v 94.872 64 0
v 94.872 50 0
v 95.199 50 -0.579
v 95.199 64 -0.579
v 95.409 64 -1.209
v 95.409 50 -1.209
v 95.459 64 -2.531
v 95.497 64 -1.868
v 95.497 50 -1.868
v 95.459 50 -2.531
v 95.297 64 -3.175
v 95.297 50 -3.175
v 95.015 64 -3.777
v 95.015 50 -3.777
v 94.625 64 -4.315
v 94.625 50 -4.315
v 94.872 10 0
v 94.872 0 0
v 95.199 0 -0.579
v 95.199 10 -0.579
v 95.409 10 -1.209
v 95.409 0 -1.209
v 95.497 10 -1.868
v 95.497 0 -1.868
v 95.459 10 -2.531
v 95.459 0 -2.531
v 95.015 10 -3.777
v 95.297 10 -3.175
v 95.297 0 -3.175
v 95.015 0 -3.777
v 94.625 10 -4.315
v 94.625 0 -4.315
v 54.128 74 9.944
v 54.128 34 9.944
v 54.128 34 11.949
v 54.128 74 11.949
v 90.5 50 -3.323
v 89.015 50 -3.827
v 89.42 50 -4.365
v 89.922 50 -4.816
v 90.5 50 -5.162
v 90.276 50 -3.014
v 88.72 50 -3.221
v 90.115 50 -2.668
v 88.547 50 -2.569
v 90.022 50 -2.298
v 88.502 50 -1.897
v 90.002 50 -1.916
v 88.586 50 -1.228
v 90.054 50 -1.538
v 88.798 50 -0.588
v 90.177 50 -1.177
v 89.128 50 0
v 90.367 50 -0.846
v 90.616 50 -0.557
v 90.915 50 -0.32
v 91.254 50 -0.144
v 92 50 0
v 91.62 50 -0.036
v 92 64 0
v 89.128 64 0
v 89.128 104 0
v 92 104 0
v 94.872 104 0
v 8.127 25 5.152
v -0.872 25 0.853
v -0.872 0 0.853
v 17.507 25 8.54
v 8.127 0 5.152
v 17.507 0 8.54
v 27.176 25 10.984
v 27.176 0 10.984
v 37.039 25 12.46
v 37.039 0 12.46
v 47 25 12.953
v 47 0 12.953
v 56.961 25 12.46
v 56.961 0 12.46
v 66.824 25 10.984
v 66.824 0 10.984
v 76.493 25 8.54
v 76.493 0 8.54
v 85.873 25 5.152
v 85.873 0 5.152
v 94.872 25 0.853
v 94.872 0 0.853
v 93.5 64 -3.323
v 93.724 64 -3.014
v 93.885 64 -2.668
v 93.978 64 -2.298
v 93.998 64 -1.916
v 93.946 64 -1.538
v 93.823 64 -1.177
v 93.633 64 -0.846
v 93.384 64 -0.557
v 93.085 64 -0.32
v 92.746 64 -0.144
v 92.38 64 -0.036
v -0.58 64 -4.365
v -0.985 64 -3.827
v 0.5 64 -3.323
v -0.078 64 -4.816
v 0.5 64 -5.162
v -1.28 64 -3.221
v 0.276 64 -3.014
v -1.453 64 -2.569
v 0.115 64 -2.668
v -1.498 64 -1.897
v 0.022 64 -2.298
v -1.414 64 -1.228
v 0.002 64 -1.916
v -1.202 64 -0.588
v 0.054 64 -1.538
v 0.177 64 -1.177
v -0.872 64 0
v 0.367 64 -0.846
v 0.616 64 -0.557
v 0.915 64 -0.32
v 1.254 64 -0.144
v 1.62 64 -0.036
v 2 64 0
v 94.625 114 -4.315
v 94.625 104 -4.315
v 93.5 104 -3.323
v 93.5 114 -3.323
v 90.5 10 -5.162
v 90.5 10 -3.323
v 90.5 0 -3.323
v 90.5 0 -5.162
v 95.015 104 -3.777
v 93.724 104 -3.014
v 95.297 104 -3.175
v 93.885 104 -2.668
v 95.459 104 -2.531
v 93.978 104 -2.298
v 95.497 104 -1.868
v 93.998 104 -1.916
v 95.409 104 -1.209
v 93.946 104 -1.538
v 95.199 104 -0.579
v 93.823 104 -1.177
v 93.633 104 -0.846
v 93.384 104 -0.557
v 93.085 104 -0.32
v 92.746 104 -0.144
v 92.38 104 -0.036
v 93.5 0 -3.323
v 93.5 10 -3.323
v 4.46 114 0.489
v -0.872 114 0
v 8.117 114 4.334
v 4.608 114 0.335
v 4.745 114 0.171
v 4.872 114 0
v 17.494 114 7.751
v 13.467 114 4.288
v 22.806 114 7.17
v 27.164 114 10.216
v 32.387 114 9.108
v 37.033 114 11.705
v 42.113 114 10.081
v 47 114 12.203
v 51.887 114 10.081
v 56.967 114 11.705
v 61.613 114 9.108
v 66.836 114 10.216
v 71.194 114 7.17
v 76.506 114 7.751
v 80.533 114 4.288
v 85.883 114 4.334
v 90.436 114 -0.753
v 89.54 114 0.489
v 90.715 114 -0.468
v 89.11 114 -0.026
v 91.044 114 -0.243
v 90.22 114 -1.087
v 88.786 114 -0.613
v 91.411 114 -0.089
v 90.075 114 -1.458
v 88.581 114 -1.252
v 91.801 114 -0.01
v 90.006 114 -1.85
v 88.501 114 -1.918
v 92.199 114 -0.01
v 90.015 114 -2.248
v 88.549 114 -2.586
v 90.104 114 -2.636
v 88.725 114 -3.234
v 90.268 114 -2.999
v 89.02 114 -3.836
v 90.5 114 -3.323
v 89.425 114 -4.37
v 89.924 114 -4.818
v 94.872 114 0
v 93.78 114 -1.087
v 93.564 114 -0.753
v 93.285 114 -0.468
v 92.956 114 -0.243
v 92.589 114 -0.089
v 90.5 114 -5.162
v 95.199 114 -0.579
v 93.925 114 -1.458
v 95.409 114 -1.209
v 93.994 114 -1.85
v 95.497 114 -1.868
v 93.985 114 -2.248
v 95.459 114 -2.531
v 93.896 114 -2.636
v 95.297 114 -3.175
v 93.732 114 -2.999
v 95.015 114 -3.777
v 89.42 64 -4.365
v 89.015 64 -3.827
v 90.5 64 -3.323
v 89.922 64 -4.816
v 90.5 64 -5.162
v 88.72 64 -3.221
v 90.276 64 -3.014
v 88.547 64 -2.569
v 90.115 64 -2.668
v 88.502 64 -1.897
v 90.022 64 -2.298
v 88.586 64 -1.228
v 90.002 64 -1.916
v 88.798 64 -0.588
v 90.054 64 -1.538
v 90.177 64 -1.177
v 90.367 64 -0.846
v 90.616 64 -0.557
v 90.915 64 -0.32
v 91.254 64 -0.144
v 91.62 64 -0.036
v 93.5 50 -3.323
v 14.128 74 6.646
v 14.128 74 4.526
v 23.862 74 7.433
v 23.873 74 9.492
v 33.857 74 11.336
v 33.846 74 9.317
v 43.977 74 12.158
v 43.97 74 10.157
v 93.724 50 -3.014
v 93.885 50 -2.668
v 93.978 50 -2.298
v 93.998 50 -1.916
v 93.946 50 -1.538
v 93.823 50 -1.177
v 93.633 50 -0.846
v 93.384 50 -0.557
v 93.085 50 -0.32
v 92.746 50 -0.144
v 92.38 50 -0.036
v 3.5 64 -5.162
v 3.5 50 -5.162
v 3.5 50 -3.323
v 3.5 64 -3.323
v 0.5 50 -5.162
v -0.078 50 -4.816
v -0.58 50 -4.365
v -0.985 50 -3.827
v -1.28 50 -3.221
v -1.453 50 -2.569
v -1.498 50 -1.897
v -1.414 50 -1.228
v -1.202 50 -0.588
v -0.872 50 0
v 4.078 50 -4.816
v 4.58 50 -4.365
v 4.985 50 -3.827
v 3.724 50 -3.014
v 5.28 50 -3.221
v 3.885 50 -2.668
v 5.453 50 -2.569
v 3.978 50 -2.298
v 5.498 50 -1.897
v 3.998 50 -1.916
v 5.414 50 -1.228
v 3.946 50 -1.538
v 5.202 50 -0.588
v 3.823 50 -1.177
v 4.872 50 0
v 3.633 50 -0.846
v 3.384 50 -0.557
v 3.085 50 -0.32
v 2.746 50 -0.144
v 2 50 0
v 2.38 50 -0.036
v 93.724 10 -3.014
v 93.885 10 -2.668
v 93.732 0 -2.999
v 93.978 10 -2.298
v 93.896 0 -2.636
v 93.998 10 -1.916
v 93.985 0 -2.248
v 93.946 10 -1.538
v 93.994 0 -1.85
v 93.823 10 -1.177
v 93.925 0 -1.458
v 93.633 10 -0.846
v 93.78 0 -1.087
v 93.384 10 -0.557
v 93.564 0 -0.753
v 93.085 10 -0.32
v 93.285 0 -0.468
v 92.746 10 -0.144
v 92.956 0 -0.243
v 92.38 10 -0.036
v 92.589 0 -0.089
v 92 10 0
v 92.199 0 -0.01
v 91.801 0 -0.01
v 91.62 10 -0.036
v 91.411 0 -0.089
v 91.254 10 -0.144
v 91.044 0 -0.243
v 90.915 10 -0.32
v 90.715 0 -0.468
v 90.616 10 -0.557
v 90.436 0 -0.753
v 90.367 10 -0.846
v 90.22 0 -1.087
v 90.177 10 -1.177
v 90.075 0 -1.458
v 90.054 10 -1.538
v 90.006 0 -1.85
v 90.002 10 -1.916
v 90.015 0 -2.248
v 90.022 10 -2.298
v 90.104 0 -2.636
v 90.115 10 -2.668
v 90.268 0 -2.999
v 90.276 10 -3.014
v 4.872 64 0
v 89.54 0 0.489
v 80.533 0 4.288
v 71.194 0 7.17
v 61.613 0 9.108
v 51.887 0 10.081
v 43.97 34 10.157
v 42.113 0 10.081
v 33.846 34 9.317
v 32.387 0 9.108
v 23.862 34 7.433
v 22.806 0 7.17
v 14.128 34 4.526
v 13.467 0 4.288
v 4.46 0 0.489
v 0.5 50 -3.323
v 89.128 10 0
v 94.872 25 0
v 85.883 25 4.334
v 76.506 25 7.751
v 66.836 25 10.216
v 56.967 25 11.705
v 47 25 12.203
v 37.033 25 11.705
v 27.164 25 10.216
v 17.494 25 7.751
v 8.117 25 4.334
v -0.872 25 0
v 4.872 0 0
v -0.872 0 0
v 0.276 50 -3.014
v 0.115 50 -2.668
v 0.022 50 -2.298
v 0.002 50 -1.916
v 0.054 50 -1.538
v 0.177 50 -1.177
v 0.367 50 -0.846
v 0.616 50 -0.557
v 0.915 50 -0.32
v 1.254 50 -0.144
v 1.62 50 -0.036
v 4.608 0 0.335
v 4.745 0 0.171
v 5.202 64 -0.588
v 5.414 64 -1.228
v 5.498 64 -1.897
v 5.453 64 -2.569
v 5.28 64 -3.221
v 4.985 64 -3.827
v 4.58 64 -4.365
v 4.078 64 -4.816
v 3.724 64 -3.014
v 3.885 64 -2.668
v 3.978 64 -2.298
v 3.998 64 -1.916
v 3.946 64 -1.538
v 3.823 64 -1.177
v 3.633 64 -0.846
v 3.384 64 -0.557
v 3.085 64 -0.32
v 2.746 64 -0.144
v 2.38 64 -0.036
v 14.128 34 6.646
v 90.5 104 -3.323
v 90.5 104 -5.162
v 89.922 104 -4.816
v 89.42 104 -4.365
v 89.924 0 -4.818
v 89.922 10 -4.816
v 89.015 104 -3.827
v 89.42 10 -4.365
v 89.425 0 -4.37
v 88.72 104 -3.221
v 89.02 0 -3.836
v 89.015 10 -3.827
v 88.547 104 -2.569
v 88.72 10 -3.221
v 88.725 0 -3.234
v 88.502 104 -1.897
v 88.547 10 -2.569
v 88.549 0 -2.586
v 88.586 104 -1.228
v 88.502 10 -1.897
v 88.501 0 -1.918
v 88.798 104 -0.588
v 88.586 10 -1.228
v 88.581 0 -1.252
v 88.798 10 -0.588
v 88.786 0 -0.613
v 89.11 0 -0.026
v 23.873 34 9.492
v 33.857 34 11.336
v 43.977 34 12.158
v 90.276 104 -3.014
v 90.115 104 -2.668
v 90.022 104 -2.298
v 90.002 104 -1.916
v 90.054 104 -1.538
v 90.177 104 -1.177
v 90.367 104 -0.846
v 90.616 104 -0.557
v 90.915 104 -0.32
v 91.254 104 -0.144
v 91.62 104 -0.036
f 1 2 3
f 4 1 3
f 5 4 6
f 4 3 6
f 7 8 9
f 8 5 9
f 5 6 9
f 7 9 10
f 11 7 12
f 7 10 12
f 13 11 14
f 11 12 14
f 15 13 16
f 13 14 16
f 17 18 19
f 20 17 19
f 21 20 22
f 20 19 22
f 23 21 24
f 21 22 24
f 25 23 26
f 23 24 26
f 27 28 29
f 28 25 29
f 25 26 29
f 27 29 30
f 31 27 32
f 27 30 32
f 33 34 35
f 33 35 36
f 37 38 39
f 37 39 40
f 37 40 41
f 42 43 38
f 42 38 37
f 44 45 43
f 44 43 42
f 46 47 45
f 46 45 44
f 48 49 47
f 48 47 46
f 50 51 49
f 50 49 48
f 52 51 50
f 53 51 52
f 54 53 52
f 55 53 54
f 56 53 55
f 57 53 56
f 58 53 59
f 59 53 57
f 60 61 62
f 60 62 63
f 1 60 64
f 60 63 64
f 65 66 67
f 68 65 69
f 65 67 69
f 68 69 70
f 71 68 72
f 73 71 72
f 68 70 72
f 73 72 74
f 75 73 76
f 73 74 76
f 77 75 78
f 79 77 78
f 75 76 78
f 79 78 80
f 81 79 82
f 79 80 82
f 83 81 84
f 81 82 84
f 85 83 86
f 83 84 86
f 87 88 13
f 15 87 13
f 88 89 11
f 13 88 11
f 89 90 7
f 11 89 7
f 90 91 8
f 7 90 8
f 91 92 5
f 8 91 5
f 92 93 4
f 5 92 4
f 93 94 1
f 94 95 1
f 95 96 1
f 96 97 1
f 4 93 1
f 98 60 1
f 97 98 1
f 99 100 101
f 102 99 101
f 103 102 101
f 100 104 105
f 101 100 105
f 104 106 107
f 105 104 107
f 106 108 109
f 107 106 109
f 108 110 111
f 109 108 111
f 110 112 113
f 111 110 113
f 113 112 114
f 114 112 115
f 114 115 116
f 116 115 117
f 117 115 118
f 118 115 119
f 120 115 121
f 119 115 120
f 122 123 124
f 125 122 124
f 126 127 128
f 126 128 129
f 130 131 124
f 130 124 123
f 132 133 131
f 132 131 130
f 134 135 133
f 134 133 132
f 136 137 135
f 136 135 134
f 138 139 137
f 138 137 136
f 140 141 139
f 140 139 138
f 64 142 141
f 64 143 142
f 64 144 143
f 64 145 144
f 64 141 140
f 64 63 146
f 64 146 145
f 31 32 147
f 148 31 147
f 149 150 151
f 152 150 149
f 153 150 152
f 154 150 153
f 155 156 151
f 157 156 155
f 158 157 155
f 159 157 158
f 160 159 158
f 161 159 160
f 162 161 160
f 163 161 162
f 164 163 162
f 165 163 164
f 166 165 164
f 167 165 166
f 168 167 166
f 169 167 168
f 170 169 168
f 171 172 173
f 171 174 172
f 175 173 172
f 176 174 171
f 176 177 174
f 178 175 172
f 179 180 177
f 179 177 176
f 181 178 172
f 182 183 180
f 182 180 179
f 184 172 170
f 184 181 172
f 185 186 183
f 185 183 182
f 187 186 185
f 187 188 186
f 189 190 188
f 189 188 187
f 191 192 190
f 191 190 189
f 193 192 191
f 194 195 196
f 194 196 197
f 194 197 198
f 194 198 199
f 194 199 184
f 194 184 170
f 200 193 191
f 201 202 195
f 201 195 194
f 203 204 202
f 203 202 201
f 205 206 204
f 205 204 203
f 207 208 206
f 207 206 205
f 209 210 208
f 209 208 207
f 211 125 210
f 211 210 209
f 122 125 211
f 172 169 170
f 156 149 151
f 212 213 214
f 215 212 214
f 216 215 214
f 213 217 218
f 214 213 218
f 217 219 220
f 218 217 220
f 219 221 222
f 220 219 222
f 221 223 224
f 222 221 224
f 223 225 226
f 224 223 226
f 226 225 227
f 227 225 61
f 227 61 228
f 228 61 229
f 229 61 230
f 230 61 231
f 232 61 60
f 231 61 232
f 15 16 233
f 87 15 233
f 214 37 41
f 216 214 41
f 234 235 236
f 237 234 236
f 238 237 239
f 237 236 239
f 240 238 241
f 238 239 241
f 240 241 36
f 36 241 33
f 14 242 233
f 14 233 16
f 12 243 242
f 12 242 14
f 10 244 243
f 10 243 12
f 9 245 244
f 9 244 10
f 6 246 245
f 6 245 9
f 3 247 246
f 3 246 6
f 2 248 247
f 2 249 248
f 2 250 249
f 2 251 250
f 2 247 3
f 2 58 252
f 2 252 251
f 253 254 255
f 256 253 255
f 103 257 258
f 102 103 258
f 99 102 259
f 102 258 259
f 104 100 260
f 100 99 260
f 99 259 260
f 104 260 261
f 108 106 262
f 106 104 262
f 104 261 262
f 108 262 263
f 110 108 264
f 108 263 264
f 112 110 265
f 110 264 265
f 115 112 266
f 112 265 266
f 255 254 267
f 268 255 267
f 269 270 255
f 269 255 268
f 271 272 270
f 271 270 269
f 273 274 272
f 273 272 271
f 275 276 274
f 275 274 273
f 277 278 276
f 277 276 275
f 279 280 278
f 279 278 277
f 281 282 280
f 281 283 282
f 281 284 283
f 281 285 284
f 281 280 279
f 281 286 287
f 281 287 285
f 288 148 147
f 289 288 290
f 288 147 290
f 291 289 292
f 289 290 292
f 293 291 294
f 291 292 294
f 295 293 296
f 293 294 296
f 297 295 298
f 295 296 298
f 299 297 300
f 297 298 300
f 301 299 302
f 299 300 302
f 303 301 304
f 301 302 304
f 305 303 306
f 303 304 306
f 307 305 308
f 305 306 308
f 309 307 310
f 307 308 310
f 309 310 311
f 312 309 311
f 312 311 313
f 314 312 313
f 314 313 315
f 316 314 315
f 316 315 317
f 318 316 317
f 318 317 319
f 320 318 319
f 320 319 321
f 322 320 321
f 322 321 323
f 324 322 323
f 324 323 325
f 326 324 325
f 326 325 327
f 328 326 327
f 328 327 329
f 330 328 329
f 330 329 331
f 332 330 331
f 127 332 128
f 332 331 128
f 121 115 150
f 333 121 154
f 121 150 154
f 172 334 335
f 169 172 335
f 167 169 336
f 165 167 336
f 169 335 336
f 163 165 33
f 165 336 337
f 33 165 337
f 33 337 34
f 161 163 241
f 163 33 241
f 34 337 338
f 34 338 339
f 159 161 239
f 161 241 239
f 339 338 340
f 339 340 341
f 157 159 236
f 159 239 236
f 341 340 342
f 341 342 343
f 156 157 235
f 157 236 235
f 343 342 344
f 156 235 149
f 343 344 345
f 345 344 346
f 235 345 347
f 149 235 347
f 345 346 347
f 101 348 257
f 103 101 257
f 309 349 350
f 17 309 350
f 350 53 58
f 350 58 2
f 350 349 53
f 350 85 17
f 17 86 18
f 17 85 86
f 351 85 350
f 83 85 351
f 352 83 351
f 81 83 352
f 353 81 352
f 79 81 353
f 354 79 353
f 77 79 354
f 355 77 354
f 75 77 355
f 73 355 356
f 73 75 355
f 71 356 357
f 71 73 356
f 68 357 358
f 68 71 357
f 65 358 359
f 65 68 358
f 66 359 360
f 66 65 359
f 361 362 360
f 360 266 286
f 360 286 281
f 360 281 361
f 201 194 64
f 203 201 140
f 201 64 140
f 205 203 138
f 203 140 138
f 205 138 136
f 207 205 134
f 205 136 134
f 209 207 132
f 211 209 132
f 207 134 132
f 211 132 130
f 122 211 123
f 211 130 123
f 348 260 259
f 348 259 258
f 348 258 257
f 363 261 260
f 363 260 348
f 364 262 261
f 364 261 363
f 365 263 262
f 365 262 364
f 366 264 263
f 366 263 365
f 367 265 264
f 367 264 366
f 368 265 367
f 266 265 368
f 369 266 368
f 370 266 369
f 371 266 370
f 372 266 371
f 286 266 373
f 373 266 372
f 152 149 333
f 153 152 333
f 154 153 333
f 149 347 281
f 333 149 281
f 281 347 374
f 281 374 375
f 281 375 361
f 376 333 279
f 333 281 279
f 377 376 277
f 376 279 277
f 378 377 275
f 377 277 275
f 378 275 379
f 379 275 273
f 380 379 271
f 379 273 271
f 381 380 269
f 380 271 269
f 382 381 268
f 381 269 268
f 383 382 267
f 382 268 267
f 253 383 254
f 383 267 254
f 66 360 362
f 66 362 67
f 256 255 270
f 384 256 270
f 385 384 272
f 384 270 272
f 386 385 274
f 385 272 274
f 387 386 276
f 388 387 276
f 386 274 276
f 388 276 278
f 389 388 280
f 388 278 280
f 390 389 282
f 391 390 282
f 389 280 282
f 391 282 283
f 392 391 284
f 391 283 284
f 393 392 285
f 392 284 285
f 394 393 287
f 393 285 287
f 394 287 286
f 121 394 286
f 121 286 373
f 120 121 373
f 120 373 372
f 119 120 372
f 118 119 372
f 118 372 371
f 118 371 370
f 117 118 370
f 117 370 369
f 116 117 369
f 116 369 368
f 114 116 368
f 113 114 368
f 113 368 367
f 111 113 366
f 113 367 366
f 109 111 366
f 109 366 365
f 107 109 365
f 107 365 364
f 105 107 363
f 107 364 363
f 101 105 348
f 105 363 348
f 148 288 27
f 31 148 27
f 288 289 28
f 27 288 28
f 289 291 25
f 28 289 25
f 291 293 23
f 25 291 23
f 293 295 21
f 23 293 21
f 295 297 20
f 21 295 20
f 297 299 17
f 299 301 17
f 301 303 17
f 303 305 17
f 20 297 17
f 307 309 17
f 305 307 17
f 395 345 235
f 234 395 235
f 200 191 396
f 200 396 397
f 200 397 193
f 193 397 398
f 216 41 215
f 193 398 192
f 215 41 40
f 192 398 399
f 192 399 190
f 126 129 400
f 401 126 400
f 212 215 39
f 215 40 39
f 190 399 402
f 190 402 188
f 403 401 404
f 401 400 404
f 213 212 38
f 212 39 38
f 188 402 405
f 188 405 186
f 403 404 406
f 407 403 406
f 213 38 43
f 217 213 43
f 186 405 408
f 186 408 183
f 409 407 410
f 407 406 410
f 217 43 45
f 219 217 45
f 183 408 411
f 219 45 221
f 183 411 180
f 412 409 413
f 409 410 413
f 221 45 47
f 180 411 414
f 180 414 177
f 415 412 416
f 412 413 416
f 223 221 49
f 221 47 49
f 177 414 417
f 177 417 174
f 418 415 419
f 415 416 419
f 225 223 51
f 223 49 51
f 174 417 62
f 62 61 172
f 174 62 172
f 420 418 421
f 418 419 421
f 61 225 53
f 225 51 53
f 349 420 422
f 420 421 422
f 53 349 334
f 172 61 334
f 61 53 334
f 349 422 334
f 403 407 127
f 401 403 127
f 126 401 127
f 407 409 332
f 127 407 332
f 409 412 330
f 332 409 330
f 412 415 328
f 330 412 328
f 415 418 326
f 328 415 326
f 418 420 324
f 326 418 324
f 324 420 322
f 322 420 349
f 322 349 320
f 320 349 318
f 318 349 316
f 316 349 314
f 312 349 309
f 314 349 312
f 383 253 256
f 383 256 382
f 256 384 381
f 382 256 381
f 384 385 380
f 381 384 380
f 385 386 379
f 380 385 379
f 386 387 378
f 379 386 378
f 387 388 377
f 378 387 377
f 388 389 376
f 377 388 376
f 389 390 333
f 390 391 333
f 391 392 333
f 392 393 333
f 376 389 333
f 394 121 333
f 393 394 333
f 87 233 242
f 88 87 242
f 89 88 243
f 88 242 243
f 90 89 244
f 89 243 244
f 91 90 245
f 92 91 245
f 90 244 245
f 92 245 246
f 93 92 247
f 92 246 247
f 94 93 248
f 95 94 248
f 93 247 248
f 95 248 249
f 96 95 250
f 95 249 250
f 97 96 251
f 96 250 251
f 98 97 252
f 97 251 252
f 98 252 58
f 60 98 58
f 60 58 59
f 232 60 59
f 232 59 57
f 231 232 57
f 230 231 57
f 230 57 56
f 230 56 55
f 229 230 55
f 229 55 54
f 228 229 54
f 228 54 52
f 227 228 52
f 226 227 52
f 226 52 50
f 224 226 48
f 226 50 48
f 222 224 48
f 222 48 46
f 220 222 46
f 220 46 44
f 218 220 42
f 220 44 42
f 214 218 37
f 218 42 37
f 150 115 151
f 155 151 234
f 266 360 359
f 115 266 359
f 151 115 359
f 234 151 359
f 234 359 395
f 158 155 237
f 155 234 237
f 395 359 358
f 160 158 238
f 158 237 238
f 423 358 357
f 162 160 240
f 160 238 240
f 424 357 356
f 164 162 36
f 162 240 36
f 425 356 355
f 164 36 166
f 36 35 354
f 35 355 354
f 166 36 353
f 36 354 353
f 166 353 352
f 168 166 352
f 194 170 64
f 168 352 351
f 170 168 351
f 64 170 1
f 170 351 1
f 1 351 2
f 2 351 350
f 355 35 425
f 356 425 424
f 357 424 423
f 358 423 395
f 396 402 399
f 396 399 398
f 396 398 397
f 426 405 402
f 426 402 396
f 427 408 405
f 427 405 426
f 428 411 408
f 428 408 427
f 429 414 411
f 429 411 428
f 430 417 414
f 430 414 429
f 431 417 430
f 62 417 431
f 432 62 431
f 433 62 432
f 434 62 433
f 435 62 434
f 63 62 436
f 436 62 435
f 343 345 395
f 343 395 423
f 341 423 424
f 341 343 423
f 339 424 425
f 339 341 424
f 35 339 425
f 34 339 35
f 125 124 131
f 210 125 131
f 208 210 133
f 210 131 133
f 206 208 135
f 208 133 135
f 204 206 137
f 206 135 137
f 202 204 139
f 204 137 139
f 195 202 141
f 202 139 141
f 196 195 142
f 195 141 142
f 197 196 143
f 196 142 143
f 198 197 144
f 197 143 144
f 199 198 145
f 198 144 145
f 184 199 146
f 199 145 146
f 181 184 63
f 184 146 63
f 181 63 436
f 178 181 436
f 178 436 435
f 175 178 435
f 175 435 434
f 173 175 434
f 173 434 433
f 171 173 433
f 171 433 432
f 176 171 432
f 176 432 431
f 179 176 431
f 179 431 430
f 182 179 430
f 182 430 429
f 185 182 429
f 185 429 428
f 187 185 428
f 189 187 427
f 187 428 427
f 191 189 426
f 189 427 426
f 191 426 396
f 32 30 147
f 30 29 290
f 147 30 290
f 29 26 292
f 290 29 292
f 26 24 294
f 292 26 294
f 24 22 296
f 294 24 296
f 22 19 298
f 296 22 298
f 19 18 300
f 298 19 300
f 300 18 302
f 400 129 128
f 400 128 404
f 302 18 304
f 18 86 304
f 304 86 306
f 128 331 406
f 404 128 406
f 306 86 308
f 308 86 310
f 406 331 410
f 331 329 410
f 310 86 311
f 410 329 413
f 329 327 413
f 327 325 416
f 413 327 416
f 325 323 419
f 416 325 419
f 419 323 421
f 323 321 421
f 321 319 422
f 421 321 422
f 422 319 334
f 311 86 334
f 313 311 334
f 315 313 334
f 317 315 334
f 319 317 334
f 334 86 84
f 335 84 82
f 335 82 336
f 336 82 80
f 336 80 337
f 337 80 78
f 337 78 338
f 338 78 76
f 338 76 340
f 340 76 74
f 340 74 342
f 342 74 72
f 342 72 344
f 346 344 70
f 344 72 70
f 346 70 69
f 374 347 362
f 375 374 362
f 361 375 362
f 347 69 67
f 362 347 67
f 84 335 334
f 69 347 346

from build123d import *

# Parameters (mm, degrees)
EXTRUDE_1_DEPTH     = 114
EXTRUDE_2_DEPTH     = 25
SKETCH_4_W          = 16.237843285
SKETCH_4_H          = 40
SKETCH_4_W_2        = 18.842025699
SKETCH_4_H_2        = 50
SKETCH_4_W_3        = 19.914336105
CUT_EXTRUDE_1_DEPTH = 20
SKETCH_5_W          = 40
SKETCH_5_H          = 40
CUT_EXTRUDE_2_DEPTH = 20


with BuildPart() as part:
    # 草图1 → 凸台-拉伸1 (new body)
    with BuildSketch(Plane(origin=(0, 0, 0), x_dir=(1, 0, 0), z_dir=(0, 1, 0))):
        with BuildLine():
            Line((90.5, 3.322875656), (90.5, 5.16227766))
            ThreePointArc((90.5, 5.16227766), (88.549473904, 2.586404006), (89.539550125, -0.489214015))
            ThreePointArc((89.539550125, -0.489214015), (47, -10.203390265), (4.460449875, -0.489214015))
            ThreePointArc((4.460449875, -0.489214015), (5.450526096, 2.586404006), (3.5, 5.16227766))
            Line((3.5, 5.16227766), (3.5, 3.322875656))
            ThreePointArc((3.5, 3.322875656), (2, 0), (0.5, 3.322875656))
            Line((0.5, 3.322875656), (0.5, 5.16227766))
            ThreePointArc((0.5, 5.16227766), (-1.382526963, 2.89917259), (-0.872281323, 0))
            ThreePointArc((-0.872281323, 0), (47, -12.203390265), (94.872281323, 0))
            ThreePointArc((94.872281323, 0), (95.494266967, 2.200245764), (94.625, 4.315032397))
            Line((94.625, 4.315032397), (93.5, 3.322875656))
            ThreePointArc((93.5, 3.322875656), (92, 0), (90.5, 3.322875656))
        make_face()
    extrude(amount=EXTRUDE_1_DEPTH)

    # 草图3 → 凸台-拉伸2 (add)
    with BuildSketch(Plane.XZ):
        with BuildLine():
            Line((-0.872281323, 0), (-0.872281323, 0.853303863))
            ThreePointArc((-0.872281323, 0.853303863), (47, 12.953390265), (94.872281323, 0.853303863))
            Line((94.872281323, 0.853303863), (94.872281323, 0))
            ThreePointArc((94.872281323, 0), (47, 12.203390265), (-0.872281323, 0))
        make_face()
    extrude(amount=-EXTRUDE_2_DEPTH)

    # 草图4 → 切除-拉伸1 (cut)
    with BuildSketch(Plane.XY):
        with Locations((92.649785841, 84)):
            Rectangle(SKETCH_4_W, SKETCH_4_H)
        with Locations((92.649785841, 30)):
            Rectangle(SKETCH_4_W, SKETCH_4_H)
        with Locations((0.967246157, 89)):
            Rectangle(SKETCH_4_W_2, SKETCH_4_H_2)
        with Locations((1.50340136, 25)):
            Rectangle(SKETCH_4_W_3, SKETCH_4_H_2)
    extrude(amount=-CUT_EXTRUDE_1_DEPTH, mode=Mode.SUBTRACT)

    # 草图5 → 切除-拉伸2 (cut)
    with BuildSketch(Plane.XY):
        with Locations((34.127718677, 54)):
            Rectangle(SKETCH_5_W, SKETCH_5_H)
    extrude(amount=CUT_EXTRUDE_2_DEPTH, mode=Mode.SUBTRACT)


solid = part.part
